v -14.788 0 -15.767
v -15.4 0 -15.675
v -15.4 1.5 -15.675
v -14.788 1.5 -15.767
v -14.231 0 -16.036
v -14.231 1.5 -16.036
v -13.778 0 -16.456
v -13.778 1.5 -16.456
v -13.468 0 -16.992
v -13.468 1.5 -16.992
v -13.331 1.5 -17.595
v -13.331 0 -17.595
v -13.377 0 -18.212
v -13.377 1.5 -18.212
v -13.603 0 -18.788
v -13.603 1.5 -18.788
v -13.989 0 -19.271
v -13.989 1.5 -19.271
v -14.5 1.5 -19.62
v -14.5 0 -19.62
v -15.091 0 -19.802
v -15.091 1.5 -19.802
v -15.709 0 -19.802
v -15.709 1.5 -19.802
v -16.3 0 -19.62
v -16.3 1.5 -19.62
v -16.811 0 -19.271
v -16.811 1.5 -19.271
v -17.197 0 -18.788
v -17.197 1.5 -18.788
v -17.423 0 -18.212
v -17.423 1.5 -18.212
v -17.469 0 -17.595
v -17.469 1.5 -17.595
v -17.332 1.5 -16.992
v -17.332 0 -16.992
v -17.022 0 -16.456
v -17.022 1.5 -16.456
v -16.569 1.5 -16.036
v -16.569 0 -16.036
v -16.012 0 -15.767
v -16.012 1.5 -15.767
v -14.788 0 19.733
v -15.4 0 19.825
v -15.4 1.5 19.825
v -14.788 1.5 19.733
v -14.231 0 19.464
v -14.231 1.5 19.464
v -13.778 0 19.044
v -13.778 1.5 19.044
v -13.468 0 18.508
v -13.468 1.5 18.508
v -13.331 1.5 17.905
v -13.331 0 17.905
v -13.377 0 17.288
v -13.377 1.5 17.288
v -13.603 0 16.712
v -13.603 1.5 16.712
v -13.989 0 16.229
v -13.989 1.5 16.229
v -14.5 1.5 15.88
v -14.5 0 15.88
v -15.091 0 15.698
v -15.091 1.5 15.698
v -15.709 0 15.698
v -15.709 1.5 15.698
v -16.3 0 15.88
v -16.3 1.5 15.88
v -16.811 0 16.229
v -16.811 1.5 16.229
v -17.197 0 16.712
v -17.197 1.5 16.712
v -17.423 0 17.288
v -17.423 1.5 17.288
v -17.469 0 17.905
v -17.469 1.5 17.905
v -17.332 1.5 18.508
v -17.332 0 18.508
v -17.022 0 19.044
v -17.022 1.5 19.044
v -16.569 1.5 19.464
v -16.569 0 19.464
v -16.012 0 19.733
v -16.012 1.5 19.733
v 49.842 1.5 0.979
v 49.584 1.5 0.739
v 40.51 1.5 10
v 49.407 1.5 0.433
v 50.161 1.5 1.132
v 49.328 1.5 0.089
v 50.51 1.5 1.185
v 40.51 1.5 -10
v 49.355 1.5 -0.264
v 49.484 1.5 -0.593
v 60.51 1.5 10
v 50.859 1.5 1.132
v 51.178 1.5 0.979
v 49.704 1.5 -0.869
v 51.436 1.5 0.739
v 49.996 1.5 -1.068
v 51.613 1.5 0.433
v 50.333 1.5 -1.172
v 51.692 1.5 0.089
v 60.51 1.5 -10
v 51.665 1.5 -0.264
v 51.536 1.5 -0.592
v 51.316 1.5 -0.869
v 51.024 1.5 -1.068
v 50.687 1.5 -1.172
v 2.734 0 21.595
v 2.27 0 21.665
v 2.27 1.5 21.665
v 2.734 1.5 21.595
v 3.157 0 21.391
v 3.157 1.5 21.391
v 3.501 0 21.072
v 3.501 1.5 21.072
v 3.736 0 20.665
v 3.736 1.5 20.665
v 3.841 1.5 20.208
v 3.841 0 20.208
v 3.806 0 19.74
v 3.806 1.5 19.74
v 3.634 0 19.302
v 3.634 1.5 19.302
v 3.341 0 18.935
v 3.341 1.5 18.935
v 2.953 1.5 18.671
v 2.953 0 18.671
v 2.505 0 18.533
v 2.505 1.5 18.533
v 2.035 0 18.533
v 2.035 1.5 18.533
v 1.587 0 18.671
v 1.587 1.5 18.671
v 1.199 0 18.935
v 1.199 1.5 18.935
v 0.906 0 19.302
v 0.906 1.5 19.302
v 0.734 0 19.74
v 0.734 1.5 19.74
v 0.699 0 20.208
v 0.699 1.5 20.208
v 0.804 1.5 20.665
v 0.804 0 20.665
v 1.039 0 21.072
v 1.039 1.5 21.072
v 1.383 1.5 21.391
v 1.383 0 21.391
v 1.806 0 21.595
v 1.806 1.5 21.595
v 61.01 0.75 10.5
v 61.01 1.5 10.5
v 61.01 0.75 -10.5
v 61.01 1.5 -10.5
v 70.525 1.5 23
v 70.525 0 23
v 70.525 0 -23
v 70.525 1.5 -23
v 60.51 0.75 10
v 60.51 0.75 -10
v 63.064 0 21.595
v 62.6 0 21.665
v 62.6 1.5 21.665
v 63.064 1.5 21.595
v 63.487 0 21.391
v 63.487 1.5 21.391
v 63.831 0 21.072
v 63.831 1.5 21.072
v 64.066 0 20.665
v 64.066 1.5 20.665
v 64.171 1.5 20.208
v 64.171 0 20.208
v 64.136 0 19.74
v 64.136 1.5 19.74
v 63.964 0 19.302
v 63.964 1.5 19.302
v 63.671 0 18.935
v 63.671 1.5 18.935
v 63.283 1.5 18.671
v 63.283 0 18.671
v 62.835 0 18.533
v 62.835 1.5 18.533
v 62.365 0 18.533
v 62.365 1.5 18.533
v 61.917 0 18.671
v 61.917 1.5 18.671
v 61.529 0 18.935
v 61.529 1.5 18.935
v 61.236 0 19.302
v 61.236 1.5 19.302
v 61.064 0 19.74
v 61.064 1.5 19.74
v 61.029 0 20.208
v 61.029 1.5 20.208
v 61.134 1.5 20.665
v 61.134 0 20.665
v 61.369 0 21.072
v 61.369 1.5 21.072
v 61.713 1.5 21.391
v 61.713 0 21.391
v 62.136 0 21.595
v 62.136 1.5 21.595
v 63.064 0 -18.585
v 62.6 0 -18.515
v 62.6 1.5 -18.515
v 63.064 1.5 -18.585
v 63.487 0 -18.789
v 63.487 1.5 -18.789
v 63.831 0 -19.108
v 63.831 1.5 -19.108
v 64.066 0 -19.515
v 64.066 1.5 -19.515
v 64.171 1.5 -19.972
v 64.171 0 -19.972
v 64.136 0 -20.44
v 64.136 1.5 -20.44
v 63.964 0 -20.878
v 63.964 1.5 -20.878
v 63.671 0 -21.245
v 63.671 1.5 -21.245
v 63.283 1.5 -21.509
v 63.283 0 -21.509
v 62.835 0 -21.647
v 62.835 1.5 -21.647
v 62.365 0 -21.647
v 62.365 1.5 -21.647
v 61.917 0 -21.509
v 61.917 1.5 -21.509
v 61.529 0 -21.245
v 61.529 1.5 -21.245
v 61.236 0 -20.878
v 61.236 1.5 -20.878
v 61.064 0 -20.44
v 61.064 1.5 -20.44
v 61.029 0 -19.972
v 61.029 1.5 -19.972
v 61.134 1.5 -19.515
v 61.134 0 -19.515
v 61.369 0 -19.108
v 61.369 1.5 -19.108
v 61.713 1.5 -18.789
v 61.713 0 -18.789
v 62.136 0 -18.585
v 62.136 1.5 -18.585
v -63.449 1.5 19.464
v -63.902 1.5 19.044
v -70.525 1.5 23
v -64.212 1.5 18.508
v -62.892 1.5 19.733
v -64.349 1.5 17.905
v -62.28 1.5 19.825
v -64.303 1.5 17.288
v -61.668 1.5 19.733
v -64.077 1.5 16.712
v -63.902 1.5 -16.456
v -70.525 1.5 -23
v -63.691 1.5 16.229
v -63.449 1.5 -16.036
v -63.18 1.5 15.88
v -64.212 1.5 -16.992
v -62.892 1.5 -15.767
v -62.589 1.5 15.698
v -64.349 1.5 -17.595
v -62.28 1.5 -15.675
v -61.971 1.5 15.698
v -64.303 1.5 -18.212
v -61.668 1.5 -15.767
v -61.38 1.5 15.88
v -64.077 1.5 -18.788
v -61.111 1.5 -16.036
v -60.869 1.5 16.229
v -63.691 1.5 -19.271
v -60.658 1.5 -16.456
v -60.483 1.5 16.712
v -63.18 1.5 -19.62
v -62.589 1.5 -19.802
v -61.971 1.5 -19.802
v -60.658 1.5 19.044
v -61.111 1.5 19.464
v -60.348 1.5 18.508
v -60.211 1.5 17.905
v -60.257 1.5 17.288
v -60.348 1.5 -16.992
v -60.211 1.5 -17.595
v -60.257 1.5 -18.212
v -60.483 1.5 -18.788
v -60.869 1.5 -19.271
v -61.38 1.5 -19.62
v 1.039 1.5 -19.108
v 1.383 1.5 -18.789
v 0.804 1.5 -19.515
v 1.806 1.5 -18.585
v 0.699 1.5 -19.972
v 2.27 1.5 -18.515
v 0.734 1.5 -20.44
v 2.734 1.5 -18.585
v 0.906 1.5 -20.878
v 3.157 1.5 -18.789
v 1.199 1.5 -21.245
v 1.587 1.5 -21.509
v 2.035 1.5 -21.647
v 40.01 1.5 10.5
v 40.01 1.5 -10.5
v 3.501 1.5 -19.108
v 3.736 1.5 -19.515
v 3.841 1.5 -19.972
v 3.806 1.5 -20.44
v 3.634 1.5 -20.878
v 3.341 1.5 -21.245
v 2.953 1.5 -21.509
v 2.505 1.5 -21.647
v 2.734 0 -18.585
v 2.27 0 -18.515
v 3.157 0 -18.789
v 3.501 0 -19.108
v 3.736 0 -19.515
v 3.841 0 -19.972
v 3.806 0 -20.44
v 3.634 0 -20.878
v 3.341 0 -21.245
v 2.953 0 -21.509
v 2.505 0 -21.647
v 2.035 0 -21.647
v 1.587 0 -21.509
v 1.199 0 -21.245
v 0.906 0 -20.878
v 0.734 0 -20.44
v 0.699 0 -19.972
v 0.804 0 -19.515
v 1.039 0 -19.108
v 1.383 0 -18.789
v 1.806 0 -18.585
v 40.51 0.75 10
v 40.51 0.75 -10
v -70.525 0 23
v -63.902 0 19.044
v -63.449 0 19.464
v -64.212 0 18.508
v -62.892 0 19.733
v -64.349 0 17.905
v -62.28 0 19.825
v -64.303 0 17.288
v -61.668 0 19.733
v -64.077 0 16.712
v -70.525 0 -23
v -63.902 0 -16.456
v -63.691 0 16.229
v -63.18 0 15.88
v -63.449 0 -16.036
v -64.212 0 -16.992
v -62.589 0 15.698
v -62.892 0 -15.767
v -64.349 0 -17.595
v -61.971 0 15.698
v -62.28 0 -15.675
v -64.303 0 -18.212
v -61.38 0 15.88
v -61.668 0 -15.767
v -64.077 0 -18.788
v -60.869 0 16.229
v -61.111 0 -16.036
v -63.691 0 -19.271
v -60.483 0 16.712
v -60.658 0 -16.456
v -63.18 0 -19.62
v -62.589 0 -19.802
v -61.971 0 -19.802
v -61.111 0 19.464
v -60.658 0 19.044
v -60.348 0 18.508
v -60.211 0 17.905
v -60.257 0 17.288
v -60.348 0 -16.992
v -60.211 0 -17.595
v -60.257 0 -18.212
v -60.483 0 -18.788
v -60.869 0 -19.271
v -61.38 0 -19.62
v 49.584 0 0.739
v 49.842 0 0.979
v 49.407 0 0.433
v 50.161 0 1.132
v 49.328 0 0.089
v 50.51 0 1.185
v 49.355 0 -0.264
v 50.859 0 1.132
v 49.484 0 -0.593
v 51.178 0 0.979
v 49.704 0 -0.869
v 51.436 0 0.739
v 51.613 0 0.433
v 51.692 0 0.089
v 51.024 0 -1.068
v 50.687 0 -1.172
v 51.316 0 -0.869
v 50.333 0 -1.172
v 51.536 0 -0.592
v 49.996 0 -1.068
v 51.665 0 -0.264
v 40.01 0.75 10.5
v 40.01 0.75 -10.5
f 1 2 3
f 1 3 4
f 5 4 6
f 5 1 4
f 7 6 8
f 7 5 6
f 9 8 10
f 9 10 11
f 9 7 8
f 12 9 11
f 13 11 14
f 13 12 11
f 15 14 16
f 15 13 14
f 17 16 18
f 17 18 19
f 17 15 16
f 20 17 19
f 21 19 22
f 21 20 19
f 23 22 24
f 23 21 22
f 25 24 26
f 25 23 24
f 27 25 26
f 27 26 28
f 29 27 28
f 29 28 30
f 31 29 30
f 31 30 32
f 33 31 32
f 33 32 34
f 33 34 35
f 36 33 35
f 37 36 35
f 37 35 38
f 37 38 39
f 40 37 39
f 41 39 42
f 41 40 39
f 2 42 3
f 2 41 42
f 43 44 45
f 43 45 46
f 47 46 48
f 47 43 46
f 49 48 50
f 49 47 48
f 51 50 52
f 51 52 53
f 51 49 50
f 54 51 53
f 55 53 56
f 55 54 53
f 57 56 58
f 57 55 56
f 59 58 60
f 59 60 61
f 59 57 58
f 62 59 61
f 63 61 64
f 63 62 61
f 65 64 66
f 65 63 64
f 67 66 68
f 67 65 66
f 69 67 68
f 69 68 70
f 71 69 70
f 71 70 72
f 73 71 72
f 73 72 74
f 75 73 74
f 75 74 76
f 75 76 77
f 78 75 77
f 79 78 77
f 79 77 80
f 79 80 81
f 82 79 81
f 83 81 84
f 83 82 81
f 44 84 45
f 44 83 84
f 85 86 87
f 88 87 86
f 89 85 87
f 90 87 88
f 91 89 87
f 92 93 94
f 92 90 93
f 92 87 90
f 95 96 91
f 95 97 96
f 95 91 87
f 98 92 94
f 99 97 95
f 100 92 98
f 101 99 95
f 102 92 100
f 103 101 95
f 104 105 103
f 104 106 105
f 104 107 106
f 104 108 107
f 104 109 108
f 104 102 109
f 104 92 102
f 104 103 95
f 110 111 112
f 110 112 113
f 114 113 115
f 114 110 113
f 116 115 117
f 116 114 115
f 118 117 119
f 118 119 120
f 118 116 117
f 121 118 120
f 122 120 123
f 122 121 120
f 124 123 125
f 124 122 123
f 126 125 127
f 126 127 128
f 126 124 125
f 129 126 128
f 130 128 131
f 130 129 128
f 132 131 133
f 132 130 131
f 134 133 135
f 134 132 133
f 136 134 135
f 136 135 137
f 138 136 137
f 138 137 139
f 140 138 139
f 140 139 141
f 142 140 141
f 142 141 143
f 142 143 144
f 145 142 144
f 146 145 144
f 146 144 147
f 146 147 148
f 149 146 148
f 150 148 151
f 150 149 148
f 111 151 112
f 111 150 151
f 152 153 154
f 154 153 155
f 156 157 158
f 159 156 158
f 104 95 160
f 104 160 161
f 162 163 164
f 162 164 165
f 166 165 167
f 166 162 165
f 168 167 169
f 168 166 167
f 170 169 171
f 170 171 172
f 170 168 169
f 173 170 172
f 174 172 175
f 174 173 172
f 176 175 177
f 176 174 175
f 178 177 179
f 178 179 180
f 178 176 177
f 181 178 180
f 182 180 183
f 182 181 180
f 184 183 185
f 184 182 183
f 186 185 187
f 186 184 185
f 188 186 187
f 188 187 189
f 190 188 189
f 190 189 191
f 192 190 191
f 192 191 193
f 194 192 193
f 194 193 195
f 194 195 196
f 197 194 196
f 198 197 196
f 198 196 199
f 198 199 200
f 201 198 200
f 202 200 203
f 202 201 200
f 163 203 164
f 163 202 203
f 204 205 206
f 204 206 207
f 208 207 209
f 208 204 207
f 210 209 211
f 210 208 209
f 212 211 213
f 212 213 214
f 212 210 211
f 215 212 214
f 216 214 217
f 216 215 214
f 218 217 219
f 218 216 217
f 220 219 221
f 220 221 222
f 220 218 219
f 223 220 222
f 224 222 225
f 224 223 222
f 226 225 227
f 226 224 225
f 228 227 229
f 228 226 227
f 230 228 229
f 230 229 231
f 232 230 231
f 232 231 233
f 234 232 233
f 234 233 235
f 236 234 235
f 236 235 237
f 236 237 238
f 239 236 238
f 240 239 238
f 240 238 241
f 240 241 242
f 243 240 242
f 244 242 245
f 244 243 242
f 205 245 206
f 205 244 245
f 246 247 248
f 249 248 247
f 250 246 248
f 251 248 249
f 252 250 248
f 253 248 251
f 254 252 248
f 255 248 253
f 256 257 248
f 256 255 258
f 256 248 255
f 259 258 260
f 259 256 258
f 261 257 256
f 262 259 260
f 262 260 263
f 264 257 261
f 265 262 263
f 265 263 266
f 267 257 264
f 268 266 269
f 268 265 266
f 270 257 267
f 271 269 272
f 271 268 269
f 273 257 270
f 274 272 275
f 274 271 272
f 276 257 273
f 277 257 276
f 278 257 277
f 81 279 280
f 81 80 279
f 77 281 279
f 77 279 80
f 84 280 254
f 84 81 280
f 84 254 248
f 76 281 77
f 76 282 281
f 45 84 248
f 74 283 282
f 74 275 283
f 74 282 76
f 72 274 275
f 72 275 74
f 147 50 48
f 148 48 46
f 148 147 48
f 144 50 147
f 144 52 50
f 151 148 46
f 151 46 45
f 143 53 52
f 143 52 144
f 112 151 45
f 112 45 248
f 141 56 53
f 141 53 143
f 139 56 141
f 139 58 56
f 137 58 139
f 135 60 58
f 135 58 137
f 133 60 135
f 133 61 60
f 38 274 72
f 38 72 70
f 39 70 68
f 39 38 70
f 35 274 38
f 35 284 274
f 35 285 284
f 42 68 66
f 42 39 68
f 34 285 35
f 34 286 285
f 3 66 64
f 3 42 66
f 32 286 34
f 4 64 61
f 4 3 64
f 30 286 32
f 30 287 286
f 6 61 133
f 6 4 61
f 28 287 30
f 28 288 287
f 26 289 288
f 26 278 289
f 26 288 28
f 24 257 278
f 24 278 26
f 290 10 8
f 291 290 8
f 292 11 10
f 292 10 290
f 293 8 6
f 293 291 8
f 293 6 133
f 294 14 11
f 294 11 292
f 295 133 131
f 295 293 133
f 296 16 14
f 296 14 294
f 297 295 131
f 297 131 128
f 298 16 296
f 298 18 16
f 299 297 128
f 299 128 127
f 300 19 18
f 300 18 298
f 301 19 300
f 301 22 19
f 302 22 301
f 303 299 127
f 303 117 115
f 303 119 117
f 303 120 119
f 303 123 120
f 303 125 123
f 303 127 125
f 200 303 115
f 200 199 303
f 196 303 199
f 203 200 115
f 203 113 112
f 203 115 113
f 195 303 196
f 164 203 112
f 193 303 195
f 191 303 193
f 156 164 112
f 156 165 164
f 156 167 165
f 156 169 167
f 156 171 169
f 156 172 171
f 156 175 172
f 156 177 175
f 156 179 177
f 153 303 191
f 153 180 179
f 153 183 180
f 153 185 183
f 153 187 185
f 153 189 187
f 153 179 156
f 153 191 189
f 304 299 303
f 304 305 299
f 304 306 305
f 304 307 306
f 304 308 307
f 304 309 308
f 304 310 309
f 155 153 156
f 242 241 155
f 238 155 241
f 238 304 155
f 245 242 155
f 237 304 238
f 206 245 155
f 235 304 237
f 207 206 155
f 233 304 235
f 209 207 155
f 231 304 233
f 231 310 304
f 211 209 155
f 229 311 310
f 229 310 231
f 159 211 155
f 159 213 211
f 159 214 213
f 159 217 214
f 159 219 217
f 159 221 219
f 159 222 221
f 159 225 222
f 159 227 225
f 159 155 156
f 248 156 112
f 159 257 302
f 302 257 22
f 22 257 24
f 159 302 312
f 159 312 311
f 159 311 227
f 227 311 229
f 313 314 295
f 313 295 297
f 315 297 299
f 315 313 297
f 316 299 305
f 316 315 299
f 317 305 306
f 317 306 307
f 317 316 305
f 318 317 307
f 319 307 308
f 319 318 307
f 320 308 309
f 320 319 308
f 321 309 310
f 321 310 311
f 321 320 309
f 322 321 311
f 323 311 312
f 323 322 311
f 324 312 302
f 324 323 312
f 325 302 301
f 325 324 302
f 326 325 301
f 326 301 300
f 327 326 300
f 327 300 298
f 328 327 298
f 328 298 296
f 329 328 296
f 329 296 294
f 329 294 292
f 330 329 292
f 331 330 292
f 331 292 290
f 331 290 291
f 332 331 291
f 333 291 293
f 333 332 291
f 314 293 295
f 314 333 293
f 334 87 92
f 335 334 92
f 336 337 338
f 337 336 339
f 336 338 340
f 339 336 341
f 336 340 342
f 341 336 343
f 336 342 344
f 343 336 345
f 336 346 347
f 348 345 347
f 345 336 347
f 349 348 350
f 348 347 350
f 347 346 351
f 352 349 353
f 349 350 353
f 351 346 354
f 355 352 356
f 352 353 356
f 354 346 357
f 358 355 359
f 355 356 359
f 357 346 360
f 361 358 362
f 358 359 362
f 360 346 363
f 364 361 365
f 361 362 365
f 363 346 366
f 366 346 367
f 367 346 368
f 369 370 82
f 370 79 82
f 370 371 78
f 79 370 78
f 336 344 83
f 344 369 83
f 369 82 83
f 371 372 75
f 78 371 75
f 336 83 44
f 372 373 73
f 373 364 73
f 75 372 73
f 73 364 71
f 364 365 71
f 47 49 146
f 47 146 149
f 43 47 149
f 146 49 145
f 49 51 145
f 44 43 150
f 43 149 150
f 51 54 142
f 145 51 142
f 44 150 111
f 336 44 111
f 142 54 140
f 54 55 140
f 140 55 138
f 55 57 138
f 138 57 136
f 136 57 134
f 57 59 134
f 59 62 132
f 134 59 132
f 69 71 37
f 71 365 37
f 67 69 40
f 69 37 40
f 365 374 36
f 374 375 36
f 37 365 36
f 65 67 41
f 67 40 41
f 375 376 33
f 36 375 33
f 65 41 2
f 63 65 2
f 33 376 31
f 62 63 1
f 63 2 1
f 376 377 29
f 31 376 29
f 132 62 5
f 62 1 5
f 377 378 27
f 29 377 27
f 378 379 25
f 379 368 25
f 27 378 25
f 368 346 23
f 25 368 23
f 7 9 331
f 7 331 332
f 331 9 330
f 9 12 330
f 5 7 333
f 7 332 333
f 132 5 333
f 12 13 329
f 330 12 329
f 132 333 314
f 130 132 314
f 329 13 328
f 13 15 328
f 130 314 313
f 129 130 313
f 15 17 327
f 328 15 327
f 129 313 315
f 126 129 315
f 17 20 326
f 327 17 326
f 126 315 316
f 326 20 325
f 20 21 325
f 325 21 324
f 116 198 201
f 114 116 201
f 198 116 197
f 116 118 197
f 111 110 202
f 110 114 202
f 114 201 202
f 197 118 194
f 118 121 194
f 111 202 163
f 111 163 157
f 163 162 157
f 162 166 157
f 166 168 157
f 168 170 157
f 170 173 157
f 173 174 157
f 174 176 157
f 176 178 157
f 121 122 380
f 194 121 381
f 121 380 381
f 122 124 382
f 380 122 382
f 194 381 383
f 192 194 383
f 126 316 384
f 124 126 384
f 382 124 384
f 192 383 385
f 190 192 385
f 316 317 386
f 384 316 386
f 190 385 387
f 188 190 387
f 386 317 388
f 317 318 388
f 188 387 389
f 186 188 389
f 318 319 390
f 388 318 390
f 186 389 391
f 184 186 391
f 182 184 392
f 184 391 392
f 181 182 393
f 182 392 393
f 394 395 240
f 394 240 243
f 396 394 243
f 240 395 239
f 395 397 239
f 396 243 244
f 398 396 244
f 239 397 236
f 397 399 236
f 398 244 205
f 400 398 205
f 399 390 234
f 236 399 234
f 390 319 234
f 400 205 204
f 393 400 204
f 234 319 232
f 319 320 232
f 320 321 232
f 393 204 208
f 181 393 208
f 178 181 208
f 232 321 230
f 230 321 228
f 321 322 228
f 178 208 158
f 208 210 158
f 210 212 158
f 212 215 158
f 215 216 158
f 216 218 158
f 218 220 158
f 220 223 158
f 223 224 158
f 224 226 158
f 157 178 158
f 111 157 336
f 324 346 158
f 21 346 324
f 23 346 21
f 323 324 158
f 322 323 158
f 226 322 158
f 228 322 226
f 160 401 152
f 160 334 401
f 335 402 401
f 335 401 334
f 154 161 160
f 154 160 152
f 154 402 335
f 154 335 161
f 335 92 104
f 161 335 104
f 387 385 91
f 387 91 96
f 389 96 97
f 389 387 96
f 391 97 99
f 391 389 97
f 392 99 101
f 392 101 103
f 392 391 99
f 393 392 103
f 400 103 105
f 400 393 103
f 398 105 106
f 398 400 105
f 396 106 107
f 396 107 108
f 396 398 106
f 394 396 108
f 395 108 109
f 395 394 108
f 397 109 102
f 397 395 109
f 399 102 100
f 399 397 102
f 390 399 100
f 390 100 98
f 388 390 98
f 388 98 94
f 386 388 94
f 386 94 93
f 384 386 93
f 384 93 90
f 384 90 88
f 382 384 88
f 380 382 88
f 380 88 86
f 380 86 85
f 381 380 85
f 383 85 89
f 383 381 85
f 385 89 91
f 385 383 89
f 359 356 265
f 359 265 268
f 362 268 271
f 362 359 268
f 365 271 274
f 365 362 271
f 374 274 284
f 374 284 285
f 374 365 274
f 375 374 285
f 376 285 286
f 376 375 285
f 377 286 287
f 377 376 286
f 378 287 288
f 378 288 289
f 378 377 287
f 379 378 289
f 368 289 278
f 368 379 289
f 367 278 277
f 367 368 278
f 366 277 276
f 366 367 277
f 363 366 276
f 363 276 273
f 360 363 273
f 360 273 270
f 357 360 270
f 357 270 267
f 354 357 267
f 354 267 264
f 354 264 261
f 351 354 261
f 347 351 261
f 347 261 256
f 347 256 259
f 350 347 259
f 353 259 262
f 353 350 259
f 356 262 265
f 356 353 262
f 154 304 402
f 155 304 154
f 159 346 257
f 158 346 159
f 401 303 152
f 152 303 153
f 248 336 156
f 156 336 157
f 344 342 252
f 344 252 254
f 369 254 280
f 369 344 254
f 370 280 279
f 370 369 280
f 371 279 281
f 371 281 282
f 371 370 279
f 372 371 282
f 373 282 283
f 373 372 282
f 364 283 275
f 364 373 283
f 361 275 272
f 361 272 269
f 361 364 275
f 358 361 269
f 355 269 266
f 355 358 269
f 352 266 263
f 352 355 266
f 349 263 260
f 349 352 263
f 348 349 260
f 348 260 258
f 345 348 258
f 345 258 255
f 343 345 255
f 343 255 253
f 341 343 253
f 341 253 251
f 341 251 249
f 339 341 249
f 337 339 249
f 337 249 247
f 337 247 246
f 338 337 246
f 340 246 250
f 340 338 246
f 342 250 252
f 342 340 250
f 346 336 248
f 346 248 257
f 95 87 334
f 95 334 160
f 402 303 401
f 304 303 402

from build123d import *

# Parameters (mm, degrees)
SKETCH1_W               = 141.05
SKETCH1_H               = 46
SKETCH1_R               = 2.075
SKETCH1_R_2             = 1.575
SKETCH1_R_3             = 1.185
BOSS_EXTRUDE1_DEPTH     = 1.5
SKETCH2_W               = 21
SKETCH2_H               = 21
SKETCH2_W_2             = 20
SKETCH2_H_2             = 20
CUT_EXTRUDE_THIN1_DEPTH = 0.75


with BuildPart() as part:
    # Sketch1 → Boss-Extrude1 (new body)
    with BuildSketch(Plane(origin=(0, 0, 0), x_dir=(1, 0, 0), z_dir=(0, 1, 0))):
        Rectangle(SKETCH1_W, SKETCH1_H)
        with Locations((-62.28, -17.75)):
            Circle(SKETCH1_R, mode=Mode.SUBTRACT)
        with Locations((-15.4, -17.75)):
            Circle(SKETCH1_R, mode=Mode.SUBTRACT)
        with Locations((-15.4, 17.75)):
            Circle(SKETCH1_R, mode=Mode.SUBTRACT)
        with Locations((-62.28, 17.75)):
            Circle(SKETCH1_R, mode=Mode.SUBTRACT)
        with Locations((2.27, -20.09)):
            Circle(SKETCH1_R_2, mode=Mode.SUBTRACT)
        with Locations((62.6, -20.09)):
            Circle(SKETCH1_R_2, mode=Mode.SUBTRACT)
        with Locations((62.6, 20.09)):
            Circle(SKETCH1_R_2, mode=Mode.SUBTRACT)
        with Locations((2.27, 20.09)):
            Circle(SKETCH1_R_2, mode=Mode.SUBTRACT)
        with Locations((50.51, 0)):
            Circle(SKETCH1_R_3, mode=Mode.SUBTRACT)
    extrude(amount=BOSS_EXTRUDE1_DEPTH)

    # Sketch2 → Cut-Extrude-Thin1 (cut)
    with BuildSketch(Plane(origin=(0, 1.5, 0), x_dir=(1, 0, 0), z_dir=(0, 1, 0))):
        with Locations((50.51, 0)):
            Rectangle(SKETCH2_W, SKETCH2_H)
        with Locations((50.51, 0)):
            Rectangle(SKETCH2_W_2, SKETCH2_H_2, mode=Mode.SUBTRACT)
    extrude(amount=-CUT_EXTRUDE_THIN1_DEPTH, mode=Mode.SUBTRACT)


solid = part.part
